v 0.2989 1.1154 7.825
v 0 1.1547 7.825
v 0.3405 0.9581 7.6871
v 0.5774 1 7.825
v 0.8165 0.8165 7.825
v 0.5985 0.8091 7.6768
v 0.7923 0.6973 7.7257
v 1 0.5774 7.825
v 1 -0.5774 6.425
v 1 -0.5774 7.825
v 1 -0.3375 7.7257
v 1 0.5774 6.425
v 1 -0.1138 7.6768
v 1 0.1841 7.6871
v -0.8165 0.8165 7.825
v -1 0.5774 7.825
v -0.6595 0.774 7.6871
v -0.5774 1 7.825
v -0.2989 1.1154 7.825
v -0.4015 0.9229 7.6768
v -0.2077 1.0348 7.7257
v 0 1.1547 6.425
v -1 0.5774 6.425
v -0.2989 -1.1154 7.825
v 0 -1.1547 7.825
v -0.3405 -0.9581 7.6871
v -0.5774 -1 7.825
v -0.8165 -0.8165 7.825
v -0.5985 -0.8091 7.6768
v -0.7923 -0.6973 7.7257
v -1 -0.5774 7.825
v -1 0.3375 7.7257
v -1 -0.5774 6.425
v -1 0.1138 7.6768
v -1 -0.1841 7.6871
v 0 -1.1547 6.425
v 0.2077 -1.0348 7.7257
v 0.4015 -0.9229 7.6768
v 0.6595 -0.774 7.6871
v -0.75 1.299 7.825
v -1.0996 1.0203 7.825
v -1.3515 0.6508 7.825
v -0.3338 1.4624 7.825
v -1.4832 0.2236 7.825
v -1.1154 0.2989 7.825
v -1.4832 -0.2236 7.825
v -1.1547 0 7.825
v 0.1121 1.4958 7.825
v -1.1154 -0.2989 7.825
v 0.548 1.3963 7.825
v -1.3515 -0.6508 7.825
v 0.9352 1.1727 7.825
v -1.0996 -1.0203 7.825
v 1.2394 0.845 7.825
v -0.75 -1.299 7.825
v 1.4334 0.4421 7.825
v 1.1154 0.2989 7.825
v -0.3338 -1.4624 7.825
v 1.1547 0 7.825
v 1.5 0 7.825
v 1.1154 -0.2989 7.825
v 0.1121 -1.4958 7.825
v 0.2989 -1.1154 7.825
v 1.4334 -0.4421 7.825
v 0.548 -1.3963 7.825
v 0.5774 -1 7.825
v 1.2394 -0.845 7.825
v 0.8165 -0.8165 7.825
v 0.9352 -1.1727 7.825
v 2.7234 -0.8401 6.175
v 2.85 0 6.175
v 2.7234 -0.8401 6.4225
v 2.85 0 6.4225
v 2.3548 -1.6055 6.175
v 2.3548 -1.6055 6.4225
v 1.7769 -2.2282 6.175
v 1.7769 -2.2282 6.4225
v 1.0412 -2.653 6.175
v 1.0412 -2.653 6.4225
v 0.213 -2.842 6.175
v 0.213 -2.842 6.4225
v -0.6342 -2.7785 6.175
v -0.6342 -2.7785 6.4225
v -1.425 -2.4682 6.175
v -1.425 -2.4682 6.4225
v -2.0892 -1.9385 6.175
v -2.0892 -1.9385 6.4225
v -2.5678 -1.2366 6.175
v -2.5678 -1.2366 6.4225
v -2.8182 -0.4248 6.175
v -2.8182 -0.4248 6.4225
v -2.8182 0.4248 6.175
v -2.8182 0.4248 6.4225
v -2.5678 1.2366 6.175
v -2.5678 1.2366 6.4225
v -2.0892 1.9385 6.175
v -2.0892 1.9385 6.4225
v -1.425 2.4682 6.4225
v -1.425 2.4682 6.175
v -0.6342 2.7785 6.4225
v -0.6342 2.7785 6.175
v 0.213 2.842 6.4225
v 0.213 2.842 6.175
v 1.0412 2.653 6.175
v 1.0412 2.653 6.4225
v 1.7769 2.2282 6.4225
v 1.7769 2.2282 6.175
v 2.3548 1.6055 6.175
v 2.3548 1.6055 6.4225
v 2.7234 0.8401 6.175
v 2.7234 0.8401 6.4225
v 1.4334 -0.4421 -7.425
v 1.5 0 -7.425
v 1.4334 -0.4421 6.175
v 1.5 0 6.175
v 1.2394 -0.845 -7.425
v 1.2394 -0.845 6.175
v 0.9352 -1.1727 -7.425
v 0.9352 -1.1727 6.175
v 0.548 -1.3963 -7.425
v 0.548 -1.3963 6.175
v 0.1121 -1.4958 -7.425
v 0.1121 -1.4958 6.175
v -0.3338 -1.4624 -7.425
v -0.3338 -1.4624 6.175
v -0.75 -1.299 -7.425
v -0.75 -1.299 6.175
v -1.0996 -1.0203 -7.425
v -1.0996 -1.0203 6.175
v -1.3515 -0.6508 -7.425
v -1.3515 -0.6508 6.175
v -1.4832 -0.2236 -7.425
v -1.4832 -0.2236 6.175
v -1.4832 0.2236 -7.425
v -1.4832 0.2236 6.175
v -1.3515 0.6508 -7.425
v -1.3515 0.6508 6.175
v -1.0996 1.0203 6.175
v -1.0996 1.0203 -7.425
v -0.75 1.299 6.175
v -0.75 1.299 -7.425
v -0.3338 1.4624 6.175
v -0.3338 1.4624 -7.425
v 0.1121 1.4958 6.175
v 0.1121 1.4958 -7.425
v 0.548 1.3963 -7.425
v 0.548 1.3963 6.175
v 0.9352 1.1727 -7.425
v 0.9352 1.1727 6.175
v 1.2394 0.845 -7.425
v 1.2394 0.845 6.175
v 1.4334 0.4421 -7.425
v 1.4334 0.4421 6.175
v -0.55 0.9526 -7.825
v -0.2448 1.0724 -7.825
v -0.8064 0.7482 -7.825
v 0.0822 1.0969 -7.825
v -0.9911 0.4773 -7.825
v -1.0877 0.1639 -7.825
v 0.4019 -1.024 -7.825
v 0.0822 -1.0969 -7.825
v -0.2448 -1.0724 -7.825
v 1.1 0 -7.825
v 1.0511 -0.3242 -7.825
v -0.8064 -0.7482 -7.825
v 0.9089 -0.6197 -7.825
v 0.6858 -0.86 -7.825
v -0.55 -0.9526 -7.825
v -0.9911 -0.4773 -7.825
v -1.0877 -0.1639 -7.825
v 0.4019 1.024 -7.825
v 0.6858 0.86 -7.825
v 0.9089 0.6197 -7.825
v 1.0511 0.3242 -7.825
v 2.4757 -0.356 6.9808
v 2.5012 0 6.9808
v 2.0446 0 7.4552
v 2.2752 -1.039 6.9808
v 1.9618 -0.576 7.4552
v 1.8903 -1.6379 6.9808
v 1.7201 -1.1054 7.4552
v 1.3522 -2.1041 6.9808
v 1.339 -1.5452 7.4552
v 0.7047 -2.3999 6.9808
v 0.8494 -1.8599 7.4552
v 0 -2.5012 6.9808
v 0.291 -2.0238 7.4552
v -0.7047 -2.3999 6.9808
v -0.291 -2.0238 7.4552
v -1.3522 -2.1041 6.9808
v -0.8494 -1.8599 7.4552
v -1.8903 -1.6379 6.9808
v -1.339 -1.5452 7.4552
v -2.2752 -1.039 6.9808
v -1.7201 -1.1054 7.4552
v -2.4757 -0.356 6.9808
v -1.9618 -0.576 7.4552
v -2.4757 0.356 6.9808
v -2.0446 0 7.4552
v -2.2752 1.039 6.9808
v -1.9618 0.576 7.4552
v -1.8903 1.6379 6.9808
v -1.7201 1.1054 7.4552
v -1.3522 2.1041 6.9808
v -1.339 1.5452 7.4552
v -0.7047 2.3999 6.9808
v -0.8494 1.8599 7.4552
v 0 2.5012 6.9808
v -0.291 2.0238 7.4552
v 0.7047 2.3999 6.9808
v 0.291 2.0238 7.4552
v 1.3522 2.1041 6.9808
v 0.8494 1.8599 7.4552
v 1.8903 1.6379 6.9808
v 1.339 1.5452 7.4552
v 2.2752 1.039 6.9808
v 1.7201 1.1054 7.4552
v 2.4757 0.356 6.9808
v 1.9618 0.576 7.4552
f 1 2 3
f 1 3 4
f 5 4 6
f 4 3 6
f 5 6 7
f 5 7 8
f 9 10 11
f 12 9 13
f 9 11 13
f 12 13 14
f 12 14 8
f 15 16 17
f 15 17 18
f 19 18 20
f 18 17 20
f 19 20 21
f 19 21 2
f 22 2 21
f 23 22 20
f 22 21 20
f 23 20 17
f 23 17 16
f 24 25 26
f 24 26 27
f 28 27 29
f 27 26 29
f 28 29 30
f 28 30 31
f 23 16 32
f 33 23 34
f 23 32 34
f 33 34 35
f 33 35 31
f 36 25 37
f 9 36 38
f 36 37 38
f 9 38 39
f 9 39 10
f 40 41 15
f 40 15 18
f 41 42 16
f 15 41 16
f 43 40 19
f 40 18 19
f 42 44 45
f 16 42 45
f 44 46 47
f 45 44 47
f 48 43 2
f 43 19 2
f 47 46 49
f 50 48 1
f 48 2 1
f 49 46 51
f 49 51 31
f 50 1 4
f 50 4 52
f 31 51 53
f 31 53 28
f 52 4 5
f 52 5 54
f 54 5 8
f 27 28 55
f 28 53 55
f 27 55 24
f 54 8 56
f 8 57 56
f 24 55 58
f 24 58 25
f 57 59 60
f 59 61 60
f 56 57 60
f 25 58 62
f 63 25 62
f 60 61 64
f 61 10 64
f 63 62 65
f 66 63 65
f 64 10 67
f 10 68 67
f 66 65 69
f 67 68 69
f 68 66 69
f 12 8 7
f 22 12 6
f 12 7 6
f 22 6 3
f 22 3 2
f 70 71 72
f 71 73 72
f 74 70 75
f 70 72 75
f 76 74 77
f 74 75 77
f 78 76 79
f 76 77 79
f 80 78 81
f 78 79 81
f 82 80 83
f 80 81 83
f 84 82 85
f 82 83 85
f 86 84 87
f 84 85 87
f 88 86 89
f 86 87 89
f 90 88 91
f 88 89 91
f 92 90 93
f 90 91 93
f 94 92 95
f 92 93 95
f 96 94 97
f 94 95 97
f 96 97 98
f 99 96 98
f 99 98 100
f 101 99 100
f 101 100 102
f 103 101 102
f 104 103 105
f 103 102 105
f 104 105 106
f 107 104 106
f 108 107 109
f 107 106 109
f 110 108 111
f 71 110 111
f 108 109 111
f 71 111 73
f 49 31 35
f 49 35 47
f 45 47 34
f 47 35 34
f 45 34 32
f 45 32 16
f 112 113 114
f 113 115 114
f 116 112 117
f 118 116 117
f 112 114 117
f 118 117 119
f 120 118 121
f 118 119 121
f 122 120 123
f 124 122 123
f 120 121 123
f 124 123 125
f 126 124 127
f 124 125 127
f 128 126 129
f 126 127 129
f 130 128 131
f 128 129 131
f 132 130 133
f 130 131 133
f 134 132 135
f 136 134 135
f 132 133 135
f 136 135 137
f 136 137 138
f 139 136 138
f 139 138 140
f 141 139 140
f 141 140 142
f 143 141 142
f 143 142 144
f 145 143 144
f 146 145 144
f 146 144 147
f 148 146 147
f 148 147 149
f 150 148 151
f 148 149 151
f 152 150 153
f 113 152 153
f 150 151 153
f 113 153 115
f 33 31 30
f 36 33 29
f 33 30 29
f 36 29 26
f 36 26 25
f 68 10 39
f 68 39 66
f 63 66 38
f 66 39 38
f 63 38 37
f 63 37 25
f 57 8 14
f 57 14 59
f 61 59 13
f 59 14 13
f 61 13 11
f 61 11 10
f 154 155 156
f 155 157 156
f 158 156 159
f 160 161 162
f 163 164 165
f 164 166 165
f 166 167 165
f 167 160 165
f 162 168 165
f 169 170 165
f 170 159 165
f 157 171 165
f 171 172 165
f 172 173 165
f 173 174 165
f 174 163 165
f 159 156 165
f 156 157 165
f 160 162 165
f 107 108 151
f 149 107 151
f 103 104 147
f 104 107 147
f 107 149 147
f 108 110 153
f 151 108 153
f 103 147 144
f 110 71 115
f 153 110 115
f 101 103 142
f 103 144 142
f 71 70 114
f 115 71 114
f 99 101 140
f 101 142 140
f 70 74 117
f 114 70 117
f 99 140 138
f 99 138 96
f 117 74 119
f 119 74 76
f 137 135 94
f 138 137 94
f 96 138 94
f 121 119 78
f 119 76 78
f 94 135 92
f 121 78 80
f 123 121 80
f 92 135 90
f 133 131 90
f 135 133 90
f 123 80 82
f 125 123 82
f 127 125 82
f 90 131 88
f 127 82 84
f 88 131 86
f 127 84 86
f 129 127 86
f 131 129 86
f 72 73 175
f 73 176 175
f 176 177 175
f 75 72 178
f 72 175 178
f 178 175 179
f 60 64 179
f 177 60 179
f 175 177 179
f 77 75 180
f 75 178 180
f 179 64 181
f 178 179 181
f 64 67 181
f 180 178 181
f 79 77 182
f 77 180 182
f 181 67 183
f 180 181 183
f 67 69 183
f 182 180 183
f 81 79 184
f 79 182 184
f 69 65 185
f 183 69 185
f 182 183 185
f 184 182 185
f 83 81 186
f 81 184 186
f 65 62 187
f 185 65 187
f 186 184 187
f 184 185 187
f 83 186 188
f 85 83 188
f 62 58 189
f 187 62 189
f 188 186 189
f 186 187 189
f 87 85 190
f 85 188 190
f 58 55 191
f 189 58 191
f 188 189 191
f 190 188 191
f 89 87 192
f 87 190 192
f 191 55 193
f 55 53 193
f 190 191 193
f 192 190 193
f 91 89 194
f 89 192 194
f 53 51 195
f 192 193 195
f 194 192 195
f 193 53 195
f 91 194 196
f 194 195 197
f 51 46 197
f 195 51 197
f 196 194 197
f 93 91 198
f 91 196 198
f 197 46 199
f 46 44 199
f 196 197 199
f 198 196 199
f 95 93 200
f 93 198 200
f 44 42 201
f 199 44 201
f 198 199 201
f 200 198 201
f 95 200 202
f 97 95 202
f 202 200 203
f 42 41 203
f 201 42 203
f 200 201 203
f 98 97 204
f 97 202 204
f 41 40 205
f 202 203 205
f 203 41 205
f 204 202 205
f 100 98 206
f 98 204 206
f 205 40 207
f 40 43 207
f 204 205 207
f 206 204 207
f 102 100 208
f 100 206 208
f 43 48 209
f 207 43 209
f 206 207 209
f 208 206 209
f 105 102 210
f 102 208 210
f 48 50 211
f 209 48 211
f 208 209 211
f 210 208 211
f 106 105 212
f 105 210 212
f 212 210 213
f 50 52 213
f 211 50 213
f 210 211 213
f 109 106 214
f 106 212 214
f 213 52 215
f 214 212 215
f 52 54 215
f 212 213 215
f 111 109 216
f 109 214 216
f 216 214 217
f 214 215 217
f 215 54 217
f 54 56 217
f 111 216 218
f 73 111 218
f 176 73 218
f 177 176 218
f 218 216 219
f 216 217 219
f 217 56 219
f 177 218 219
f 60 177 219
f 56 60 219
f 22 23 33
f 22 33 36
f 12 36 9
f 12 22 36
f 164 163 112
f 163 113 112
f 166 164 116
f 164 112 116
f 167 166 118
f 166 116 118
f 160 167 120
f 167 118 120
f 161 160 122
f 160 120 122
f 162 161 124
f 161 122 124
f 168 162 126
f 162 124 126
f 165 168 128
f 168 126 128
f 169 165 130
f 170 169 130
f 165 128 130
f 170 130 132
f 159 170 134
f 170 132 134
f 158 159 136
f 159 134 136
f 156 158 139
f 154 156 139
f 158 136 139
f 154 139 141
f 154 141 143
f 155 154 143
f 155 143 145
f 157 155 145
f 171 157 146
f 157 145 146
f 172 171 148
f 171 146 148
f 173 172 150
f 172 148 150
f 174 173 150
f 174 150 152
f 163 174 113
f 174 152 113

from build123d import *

# Parameters (mm, degrees)
CUT_EXTRUDE1_DEPTH = 1.4


with BuildPart() as part:
    # Sketch2 → Revolve1 (revolve)
    with BuildSketch(Plane(origin=(0, 0, 0), x_dir=(0, 0, -1), z_dir=(1, 0, 0)), mode=Mode.PRIVATE) as revolve1_sk:
        with BuildLine():
            Line((-7.825, 0), (7.825, 0))
            Line((7.825, 0), (7.825, 1.1))
            Line((7.825, 1.1), (7.425, 1.5))
            Line((7.425, 1.5), (-6.175, 1.5))
            Line((-6.175, 1.5), (-6.175, 2.85))
            Line((-6.175, 2.85), (-6.4225, 2.85))
            ThreePointArc((-6.4225, 2.85), (-7.22987489, 2.285251969), (-7.825, 1.5))
            Line((-7.825, 1.5), (-7.825, 0))
        make_face()
    revolve(revolve1_sk.sketch.rotate(Axis((0, 0, 7.825), (0, 0, -1)), 90), axis=Axis((0, 0, 7.825), (0, 0, -1)))

    # Sketch3 → Cut-Extrude1 (cut)
    with BuildSketch(Plane.XY.offset(7.825)):
        Polygon((0, 1.154700538), (-1, 0.577350269), (-1, -0.577350269), (0, -1.154700538), (1, -0.577350269), (1, 0.577350269), align=None)
    extrude(amount=-CUT_EXTRUDE1_DEPTH, mode=Mode.SUBTRACT)

    # Cut-Extrude2 cone 1 section (through the dimple's axis) → Cut-Extrude2 (revolve, cut)
    with BuildSketch(Plane(origin=(0, 0, 7.825), x_dir=(0, -1, 0), z_dir=(1, 0, 0))):
        Polygon((0, 0), (1.154700538, 0), (0, 1.154700538), align=None)
    revolve(axis=Axis((0, 0, 7.825), (0, 0, -1)), mode=Mode.SUBTRACT)


solid = part.part
